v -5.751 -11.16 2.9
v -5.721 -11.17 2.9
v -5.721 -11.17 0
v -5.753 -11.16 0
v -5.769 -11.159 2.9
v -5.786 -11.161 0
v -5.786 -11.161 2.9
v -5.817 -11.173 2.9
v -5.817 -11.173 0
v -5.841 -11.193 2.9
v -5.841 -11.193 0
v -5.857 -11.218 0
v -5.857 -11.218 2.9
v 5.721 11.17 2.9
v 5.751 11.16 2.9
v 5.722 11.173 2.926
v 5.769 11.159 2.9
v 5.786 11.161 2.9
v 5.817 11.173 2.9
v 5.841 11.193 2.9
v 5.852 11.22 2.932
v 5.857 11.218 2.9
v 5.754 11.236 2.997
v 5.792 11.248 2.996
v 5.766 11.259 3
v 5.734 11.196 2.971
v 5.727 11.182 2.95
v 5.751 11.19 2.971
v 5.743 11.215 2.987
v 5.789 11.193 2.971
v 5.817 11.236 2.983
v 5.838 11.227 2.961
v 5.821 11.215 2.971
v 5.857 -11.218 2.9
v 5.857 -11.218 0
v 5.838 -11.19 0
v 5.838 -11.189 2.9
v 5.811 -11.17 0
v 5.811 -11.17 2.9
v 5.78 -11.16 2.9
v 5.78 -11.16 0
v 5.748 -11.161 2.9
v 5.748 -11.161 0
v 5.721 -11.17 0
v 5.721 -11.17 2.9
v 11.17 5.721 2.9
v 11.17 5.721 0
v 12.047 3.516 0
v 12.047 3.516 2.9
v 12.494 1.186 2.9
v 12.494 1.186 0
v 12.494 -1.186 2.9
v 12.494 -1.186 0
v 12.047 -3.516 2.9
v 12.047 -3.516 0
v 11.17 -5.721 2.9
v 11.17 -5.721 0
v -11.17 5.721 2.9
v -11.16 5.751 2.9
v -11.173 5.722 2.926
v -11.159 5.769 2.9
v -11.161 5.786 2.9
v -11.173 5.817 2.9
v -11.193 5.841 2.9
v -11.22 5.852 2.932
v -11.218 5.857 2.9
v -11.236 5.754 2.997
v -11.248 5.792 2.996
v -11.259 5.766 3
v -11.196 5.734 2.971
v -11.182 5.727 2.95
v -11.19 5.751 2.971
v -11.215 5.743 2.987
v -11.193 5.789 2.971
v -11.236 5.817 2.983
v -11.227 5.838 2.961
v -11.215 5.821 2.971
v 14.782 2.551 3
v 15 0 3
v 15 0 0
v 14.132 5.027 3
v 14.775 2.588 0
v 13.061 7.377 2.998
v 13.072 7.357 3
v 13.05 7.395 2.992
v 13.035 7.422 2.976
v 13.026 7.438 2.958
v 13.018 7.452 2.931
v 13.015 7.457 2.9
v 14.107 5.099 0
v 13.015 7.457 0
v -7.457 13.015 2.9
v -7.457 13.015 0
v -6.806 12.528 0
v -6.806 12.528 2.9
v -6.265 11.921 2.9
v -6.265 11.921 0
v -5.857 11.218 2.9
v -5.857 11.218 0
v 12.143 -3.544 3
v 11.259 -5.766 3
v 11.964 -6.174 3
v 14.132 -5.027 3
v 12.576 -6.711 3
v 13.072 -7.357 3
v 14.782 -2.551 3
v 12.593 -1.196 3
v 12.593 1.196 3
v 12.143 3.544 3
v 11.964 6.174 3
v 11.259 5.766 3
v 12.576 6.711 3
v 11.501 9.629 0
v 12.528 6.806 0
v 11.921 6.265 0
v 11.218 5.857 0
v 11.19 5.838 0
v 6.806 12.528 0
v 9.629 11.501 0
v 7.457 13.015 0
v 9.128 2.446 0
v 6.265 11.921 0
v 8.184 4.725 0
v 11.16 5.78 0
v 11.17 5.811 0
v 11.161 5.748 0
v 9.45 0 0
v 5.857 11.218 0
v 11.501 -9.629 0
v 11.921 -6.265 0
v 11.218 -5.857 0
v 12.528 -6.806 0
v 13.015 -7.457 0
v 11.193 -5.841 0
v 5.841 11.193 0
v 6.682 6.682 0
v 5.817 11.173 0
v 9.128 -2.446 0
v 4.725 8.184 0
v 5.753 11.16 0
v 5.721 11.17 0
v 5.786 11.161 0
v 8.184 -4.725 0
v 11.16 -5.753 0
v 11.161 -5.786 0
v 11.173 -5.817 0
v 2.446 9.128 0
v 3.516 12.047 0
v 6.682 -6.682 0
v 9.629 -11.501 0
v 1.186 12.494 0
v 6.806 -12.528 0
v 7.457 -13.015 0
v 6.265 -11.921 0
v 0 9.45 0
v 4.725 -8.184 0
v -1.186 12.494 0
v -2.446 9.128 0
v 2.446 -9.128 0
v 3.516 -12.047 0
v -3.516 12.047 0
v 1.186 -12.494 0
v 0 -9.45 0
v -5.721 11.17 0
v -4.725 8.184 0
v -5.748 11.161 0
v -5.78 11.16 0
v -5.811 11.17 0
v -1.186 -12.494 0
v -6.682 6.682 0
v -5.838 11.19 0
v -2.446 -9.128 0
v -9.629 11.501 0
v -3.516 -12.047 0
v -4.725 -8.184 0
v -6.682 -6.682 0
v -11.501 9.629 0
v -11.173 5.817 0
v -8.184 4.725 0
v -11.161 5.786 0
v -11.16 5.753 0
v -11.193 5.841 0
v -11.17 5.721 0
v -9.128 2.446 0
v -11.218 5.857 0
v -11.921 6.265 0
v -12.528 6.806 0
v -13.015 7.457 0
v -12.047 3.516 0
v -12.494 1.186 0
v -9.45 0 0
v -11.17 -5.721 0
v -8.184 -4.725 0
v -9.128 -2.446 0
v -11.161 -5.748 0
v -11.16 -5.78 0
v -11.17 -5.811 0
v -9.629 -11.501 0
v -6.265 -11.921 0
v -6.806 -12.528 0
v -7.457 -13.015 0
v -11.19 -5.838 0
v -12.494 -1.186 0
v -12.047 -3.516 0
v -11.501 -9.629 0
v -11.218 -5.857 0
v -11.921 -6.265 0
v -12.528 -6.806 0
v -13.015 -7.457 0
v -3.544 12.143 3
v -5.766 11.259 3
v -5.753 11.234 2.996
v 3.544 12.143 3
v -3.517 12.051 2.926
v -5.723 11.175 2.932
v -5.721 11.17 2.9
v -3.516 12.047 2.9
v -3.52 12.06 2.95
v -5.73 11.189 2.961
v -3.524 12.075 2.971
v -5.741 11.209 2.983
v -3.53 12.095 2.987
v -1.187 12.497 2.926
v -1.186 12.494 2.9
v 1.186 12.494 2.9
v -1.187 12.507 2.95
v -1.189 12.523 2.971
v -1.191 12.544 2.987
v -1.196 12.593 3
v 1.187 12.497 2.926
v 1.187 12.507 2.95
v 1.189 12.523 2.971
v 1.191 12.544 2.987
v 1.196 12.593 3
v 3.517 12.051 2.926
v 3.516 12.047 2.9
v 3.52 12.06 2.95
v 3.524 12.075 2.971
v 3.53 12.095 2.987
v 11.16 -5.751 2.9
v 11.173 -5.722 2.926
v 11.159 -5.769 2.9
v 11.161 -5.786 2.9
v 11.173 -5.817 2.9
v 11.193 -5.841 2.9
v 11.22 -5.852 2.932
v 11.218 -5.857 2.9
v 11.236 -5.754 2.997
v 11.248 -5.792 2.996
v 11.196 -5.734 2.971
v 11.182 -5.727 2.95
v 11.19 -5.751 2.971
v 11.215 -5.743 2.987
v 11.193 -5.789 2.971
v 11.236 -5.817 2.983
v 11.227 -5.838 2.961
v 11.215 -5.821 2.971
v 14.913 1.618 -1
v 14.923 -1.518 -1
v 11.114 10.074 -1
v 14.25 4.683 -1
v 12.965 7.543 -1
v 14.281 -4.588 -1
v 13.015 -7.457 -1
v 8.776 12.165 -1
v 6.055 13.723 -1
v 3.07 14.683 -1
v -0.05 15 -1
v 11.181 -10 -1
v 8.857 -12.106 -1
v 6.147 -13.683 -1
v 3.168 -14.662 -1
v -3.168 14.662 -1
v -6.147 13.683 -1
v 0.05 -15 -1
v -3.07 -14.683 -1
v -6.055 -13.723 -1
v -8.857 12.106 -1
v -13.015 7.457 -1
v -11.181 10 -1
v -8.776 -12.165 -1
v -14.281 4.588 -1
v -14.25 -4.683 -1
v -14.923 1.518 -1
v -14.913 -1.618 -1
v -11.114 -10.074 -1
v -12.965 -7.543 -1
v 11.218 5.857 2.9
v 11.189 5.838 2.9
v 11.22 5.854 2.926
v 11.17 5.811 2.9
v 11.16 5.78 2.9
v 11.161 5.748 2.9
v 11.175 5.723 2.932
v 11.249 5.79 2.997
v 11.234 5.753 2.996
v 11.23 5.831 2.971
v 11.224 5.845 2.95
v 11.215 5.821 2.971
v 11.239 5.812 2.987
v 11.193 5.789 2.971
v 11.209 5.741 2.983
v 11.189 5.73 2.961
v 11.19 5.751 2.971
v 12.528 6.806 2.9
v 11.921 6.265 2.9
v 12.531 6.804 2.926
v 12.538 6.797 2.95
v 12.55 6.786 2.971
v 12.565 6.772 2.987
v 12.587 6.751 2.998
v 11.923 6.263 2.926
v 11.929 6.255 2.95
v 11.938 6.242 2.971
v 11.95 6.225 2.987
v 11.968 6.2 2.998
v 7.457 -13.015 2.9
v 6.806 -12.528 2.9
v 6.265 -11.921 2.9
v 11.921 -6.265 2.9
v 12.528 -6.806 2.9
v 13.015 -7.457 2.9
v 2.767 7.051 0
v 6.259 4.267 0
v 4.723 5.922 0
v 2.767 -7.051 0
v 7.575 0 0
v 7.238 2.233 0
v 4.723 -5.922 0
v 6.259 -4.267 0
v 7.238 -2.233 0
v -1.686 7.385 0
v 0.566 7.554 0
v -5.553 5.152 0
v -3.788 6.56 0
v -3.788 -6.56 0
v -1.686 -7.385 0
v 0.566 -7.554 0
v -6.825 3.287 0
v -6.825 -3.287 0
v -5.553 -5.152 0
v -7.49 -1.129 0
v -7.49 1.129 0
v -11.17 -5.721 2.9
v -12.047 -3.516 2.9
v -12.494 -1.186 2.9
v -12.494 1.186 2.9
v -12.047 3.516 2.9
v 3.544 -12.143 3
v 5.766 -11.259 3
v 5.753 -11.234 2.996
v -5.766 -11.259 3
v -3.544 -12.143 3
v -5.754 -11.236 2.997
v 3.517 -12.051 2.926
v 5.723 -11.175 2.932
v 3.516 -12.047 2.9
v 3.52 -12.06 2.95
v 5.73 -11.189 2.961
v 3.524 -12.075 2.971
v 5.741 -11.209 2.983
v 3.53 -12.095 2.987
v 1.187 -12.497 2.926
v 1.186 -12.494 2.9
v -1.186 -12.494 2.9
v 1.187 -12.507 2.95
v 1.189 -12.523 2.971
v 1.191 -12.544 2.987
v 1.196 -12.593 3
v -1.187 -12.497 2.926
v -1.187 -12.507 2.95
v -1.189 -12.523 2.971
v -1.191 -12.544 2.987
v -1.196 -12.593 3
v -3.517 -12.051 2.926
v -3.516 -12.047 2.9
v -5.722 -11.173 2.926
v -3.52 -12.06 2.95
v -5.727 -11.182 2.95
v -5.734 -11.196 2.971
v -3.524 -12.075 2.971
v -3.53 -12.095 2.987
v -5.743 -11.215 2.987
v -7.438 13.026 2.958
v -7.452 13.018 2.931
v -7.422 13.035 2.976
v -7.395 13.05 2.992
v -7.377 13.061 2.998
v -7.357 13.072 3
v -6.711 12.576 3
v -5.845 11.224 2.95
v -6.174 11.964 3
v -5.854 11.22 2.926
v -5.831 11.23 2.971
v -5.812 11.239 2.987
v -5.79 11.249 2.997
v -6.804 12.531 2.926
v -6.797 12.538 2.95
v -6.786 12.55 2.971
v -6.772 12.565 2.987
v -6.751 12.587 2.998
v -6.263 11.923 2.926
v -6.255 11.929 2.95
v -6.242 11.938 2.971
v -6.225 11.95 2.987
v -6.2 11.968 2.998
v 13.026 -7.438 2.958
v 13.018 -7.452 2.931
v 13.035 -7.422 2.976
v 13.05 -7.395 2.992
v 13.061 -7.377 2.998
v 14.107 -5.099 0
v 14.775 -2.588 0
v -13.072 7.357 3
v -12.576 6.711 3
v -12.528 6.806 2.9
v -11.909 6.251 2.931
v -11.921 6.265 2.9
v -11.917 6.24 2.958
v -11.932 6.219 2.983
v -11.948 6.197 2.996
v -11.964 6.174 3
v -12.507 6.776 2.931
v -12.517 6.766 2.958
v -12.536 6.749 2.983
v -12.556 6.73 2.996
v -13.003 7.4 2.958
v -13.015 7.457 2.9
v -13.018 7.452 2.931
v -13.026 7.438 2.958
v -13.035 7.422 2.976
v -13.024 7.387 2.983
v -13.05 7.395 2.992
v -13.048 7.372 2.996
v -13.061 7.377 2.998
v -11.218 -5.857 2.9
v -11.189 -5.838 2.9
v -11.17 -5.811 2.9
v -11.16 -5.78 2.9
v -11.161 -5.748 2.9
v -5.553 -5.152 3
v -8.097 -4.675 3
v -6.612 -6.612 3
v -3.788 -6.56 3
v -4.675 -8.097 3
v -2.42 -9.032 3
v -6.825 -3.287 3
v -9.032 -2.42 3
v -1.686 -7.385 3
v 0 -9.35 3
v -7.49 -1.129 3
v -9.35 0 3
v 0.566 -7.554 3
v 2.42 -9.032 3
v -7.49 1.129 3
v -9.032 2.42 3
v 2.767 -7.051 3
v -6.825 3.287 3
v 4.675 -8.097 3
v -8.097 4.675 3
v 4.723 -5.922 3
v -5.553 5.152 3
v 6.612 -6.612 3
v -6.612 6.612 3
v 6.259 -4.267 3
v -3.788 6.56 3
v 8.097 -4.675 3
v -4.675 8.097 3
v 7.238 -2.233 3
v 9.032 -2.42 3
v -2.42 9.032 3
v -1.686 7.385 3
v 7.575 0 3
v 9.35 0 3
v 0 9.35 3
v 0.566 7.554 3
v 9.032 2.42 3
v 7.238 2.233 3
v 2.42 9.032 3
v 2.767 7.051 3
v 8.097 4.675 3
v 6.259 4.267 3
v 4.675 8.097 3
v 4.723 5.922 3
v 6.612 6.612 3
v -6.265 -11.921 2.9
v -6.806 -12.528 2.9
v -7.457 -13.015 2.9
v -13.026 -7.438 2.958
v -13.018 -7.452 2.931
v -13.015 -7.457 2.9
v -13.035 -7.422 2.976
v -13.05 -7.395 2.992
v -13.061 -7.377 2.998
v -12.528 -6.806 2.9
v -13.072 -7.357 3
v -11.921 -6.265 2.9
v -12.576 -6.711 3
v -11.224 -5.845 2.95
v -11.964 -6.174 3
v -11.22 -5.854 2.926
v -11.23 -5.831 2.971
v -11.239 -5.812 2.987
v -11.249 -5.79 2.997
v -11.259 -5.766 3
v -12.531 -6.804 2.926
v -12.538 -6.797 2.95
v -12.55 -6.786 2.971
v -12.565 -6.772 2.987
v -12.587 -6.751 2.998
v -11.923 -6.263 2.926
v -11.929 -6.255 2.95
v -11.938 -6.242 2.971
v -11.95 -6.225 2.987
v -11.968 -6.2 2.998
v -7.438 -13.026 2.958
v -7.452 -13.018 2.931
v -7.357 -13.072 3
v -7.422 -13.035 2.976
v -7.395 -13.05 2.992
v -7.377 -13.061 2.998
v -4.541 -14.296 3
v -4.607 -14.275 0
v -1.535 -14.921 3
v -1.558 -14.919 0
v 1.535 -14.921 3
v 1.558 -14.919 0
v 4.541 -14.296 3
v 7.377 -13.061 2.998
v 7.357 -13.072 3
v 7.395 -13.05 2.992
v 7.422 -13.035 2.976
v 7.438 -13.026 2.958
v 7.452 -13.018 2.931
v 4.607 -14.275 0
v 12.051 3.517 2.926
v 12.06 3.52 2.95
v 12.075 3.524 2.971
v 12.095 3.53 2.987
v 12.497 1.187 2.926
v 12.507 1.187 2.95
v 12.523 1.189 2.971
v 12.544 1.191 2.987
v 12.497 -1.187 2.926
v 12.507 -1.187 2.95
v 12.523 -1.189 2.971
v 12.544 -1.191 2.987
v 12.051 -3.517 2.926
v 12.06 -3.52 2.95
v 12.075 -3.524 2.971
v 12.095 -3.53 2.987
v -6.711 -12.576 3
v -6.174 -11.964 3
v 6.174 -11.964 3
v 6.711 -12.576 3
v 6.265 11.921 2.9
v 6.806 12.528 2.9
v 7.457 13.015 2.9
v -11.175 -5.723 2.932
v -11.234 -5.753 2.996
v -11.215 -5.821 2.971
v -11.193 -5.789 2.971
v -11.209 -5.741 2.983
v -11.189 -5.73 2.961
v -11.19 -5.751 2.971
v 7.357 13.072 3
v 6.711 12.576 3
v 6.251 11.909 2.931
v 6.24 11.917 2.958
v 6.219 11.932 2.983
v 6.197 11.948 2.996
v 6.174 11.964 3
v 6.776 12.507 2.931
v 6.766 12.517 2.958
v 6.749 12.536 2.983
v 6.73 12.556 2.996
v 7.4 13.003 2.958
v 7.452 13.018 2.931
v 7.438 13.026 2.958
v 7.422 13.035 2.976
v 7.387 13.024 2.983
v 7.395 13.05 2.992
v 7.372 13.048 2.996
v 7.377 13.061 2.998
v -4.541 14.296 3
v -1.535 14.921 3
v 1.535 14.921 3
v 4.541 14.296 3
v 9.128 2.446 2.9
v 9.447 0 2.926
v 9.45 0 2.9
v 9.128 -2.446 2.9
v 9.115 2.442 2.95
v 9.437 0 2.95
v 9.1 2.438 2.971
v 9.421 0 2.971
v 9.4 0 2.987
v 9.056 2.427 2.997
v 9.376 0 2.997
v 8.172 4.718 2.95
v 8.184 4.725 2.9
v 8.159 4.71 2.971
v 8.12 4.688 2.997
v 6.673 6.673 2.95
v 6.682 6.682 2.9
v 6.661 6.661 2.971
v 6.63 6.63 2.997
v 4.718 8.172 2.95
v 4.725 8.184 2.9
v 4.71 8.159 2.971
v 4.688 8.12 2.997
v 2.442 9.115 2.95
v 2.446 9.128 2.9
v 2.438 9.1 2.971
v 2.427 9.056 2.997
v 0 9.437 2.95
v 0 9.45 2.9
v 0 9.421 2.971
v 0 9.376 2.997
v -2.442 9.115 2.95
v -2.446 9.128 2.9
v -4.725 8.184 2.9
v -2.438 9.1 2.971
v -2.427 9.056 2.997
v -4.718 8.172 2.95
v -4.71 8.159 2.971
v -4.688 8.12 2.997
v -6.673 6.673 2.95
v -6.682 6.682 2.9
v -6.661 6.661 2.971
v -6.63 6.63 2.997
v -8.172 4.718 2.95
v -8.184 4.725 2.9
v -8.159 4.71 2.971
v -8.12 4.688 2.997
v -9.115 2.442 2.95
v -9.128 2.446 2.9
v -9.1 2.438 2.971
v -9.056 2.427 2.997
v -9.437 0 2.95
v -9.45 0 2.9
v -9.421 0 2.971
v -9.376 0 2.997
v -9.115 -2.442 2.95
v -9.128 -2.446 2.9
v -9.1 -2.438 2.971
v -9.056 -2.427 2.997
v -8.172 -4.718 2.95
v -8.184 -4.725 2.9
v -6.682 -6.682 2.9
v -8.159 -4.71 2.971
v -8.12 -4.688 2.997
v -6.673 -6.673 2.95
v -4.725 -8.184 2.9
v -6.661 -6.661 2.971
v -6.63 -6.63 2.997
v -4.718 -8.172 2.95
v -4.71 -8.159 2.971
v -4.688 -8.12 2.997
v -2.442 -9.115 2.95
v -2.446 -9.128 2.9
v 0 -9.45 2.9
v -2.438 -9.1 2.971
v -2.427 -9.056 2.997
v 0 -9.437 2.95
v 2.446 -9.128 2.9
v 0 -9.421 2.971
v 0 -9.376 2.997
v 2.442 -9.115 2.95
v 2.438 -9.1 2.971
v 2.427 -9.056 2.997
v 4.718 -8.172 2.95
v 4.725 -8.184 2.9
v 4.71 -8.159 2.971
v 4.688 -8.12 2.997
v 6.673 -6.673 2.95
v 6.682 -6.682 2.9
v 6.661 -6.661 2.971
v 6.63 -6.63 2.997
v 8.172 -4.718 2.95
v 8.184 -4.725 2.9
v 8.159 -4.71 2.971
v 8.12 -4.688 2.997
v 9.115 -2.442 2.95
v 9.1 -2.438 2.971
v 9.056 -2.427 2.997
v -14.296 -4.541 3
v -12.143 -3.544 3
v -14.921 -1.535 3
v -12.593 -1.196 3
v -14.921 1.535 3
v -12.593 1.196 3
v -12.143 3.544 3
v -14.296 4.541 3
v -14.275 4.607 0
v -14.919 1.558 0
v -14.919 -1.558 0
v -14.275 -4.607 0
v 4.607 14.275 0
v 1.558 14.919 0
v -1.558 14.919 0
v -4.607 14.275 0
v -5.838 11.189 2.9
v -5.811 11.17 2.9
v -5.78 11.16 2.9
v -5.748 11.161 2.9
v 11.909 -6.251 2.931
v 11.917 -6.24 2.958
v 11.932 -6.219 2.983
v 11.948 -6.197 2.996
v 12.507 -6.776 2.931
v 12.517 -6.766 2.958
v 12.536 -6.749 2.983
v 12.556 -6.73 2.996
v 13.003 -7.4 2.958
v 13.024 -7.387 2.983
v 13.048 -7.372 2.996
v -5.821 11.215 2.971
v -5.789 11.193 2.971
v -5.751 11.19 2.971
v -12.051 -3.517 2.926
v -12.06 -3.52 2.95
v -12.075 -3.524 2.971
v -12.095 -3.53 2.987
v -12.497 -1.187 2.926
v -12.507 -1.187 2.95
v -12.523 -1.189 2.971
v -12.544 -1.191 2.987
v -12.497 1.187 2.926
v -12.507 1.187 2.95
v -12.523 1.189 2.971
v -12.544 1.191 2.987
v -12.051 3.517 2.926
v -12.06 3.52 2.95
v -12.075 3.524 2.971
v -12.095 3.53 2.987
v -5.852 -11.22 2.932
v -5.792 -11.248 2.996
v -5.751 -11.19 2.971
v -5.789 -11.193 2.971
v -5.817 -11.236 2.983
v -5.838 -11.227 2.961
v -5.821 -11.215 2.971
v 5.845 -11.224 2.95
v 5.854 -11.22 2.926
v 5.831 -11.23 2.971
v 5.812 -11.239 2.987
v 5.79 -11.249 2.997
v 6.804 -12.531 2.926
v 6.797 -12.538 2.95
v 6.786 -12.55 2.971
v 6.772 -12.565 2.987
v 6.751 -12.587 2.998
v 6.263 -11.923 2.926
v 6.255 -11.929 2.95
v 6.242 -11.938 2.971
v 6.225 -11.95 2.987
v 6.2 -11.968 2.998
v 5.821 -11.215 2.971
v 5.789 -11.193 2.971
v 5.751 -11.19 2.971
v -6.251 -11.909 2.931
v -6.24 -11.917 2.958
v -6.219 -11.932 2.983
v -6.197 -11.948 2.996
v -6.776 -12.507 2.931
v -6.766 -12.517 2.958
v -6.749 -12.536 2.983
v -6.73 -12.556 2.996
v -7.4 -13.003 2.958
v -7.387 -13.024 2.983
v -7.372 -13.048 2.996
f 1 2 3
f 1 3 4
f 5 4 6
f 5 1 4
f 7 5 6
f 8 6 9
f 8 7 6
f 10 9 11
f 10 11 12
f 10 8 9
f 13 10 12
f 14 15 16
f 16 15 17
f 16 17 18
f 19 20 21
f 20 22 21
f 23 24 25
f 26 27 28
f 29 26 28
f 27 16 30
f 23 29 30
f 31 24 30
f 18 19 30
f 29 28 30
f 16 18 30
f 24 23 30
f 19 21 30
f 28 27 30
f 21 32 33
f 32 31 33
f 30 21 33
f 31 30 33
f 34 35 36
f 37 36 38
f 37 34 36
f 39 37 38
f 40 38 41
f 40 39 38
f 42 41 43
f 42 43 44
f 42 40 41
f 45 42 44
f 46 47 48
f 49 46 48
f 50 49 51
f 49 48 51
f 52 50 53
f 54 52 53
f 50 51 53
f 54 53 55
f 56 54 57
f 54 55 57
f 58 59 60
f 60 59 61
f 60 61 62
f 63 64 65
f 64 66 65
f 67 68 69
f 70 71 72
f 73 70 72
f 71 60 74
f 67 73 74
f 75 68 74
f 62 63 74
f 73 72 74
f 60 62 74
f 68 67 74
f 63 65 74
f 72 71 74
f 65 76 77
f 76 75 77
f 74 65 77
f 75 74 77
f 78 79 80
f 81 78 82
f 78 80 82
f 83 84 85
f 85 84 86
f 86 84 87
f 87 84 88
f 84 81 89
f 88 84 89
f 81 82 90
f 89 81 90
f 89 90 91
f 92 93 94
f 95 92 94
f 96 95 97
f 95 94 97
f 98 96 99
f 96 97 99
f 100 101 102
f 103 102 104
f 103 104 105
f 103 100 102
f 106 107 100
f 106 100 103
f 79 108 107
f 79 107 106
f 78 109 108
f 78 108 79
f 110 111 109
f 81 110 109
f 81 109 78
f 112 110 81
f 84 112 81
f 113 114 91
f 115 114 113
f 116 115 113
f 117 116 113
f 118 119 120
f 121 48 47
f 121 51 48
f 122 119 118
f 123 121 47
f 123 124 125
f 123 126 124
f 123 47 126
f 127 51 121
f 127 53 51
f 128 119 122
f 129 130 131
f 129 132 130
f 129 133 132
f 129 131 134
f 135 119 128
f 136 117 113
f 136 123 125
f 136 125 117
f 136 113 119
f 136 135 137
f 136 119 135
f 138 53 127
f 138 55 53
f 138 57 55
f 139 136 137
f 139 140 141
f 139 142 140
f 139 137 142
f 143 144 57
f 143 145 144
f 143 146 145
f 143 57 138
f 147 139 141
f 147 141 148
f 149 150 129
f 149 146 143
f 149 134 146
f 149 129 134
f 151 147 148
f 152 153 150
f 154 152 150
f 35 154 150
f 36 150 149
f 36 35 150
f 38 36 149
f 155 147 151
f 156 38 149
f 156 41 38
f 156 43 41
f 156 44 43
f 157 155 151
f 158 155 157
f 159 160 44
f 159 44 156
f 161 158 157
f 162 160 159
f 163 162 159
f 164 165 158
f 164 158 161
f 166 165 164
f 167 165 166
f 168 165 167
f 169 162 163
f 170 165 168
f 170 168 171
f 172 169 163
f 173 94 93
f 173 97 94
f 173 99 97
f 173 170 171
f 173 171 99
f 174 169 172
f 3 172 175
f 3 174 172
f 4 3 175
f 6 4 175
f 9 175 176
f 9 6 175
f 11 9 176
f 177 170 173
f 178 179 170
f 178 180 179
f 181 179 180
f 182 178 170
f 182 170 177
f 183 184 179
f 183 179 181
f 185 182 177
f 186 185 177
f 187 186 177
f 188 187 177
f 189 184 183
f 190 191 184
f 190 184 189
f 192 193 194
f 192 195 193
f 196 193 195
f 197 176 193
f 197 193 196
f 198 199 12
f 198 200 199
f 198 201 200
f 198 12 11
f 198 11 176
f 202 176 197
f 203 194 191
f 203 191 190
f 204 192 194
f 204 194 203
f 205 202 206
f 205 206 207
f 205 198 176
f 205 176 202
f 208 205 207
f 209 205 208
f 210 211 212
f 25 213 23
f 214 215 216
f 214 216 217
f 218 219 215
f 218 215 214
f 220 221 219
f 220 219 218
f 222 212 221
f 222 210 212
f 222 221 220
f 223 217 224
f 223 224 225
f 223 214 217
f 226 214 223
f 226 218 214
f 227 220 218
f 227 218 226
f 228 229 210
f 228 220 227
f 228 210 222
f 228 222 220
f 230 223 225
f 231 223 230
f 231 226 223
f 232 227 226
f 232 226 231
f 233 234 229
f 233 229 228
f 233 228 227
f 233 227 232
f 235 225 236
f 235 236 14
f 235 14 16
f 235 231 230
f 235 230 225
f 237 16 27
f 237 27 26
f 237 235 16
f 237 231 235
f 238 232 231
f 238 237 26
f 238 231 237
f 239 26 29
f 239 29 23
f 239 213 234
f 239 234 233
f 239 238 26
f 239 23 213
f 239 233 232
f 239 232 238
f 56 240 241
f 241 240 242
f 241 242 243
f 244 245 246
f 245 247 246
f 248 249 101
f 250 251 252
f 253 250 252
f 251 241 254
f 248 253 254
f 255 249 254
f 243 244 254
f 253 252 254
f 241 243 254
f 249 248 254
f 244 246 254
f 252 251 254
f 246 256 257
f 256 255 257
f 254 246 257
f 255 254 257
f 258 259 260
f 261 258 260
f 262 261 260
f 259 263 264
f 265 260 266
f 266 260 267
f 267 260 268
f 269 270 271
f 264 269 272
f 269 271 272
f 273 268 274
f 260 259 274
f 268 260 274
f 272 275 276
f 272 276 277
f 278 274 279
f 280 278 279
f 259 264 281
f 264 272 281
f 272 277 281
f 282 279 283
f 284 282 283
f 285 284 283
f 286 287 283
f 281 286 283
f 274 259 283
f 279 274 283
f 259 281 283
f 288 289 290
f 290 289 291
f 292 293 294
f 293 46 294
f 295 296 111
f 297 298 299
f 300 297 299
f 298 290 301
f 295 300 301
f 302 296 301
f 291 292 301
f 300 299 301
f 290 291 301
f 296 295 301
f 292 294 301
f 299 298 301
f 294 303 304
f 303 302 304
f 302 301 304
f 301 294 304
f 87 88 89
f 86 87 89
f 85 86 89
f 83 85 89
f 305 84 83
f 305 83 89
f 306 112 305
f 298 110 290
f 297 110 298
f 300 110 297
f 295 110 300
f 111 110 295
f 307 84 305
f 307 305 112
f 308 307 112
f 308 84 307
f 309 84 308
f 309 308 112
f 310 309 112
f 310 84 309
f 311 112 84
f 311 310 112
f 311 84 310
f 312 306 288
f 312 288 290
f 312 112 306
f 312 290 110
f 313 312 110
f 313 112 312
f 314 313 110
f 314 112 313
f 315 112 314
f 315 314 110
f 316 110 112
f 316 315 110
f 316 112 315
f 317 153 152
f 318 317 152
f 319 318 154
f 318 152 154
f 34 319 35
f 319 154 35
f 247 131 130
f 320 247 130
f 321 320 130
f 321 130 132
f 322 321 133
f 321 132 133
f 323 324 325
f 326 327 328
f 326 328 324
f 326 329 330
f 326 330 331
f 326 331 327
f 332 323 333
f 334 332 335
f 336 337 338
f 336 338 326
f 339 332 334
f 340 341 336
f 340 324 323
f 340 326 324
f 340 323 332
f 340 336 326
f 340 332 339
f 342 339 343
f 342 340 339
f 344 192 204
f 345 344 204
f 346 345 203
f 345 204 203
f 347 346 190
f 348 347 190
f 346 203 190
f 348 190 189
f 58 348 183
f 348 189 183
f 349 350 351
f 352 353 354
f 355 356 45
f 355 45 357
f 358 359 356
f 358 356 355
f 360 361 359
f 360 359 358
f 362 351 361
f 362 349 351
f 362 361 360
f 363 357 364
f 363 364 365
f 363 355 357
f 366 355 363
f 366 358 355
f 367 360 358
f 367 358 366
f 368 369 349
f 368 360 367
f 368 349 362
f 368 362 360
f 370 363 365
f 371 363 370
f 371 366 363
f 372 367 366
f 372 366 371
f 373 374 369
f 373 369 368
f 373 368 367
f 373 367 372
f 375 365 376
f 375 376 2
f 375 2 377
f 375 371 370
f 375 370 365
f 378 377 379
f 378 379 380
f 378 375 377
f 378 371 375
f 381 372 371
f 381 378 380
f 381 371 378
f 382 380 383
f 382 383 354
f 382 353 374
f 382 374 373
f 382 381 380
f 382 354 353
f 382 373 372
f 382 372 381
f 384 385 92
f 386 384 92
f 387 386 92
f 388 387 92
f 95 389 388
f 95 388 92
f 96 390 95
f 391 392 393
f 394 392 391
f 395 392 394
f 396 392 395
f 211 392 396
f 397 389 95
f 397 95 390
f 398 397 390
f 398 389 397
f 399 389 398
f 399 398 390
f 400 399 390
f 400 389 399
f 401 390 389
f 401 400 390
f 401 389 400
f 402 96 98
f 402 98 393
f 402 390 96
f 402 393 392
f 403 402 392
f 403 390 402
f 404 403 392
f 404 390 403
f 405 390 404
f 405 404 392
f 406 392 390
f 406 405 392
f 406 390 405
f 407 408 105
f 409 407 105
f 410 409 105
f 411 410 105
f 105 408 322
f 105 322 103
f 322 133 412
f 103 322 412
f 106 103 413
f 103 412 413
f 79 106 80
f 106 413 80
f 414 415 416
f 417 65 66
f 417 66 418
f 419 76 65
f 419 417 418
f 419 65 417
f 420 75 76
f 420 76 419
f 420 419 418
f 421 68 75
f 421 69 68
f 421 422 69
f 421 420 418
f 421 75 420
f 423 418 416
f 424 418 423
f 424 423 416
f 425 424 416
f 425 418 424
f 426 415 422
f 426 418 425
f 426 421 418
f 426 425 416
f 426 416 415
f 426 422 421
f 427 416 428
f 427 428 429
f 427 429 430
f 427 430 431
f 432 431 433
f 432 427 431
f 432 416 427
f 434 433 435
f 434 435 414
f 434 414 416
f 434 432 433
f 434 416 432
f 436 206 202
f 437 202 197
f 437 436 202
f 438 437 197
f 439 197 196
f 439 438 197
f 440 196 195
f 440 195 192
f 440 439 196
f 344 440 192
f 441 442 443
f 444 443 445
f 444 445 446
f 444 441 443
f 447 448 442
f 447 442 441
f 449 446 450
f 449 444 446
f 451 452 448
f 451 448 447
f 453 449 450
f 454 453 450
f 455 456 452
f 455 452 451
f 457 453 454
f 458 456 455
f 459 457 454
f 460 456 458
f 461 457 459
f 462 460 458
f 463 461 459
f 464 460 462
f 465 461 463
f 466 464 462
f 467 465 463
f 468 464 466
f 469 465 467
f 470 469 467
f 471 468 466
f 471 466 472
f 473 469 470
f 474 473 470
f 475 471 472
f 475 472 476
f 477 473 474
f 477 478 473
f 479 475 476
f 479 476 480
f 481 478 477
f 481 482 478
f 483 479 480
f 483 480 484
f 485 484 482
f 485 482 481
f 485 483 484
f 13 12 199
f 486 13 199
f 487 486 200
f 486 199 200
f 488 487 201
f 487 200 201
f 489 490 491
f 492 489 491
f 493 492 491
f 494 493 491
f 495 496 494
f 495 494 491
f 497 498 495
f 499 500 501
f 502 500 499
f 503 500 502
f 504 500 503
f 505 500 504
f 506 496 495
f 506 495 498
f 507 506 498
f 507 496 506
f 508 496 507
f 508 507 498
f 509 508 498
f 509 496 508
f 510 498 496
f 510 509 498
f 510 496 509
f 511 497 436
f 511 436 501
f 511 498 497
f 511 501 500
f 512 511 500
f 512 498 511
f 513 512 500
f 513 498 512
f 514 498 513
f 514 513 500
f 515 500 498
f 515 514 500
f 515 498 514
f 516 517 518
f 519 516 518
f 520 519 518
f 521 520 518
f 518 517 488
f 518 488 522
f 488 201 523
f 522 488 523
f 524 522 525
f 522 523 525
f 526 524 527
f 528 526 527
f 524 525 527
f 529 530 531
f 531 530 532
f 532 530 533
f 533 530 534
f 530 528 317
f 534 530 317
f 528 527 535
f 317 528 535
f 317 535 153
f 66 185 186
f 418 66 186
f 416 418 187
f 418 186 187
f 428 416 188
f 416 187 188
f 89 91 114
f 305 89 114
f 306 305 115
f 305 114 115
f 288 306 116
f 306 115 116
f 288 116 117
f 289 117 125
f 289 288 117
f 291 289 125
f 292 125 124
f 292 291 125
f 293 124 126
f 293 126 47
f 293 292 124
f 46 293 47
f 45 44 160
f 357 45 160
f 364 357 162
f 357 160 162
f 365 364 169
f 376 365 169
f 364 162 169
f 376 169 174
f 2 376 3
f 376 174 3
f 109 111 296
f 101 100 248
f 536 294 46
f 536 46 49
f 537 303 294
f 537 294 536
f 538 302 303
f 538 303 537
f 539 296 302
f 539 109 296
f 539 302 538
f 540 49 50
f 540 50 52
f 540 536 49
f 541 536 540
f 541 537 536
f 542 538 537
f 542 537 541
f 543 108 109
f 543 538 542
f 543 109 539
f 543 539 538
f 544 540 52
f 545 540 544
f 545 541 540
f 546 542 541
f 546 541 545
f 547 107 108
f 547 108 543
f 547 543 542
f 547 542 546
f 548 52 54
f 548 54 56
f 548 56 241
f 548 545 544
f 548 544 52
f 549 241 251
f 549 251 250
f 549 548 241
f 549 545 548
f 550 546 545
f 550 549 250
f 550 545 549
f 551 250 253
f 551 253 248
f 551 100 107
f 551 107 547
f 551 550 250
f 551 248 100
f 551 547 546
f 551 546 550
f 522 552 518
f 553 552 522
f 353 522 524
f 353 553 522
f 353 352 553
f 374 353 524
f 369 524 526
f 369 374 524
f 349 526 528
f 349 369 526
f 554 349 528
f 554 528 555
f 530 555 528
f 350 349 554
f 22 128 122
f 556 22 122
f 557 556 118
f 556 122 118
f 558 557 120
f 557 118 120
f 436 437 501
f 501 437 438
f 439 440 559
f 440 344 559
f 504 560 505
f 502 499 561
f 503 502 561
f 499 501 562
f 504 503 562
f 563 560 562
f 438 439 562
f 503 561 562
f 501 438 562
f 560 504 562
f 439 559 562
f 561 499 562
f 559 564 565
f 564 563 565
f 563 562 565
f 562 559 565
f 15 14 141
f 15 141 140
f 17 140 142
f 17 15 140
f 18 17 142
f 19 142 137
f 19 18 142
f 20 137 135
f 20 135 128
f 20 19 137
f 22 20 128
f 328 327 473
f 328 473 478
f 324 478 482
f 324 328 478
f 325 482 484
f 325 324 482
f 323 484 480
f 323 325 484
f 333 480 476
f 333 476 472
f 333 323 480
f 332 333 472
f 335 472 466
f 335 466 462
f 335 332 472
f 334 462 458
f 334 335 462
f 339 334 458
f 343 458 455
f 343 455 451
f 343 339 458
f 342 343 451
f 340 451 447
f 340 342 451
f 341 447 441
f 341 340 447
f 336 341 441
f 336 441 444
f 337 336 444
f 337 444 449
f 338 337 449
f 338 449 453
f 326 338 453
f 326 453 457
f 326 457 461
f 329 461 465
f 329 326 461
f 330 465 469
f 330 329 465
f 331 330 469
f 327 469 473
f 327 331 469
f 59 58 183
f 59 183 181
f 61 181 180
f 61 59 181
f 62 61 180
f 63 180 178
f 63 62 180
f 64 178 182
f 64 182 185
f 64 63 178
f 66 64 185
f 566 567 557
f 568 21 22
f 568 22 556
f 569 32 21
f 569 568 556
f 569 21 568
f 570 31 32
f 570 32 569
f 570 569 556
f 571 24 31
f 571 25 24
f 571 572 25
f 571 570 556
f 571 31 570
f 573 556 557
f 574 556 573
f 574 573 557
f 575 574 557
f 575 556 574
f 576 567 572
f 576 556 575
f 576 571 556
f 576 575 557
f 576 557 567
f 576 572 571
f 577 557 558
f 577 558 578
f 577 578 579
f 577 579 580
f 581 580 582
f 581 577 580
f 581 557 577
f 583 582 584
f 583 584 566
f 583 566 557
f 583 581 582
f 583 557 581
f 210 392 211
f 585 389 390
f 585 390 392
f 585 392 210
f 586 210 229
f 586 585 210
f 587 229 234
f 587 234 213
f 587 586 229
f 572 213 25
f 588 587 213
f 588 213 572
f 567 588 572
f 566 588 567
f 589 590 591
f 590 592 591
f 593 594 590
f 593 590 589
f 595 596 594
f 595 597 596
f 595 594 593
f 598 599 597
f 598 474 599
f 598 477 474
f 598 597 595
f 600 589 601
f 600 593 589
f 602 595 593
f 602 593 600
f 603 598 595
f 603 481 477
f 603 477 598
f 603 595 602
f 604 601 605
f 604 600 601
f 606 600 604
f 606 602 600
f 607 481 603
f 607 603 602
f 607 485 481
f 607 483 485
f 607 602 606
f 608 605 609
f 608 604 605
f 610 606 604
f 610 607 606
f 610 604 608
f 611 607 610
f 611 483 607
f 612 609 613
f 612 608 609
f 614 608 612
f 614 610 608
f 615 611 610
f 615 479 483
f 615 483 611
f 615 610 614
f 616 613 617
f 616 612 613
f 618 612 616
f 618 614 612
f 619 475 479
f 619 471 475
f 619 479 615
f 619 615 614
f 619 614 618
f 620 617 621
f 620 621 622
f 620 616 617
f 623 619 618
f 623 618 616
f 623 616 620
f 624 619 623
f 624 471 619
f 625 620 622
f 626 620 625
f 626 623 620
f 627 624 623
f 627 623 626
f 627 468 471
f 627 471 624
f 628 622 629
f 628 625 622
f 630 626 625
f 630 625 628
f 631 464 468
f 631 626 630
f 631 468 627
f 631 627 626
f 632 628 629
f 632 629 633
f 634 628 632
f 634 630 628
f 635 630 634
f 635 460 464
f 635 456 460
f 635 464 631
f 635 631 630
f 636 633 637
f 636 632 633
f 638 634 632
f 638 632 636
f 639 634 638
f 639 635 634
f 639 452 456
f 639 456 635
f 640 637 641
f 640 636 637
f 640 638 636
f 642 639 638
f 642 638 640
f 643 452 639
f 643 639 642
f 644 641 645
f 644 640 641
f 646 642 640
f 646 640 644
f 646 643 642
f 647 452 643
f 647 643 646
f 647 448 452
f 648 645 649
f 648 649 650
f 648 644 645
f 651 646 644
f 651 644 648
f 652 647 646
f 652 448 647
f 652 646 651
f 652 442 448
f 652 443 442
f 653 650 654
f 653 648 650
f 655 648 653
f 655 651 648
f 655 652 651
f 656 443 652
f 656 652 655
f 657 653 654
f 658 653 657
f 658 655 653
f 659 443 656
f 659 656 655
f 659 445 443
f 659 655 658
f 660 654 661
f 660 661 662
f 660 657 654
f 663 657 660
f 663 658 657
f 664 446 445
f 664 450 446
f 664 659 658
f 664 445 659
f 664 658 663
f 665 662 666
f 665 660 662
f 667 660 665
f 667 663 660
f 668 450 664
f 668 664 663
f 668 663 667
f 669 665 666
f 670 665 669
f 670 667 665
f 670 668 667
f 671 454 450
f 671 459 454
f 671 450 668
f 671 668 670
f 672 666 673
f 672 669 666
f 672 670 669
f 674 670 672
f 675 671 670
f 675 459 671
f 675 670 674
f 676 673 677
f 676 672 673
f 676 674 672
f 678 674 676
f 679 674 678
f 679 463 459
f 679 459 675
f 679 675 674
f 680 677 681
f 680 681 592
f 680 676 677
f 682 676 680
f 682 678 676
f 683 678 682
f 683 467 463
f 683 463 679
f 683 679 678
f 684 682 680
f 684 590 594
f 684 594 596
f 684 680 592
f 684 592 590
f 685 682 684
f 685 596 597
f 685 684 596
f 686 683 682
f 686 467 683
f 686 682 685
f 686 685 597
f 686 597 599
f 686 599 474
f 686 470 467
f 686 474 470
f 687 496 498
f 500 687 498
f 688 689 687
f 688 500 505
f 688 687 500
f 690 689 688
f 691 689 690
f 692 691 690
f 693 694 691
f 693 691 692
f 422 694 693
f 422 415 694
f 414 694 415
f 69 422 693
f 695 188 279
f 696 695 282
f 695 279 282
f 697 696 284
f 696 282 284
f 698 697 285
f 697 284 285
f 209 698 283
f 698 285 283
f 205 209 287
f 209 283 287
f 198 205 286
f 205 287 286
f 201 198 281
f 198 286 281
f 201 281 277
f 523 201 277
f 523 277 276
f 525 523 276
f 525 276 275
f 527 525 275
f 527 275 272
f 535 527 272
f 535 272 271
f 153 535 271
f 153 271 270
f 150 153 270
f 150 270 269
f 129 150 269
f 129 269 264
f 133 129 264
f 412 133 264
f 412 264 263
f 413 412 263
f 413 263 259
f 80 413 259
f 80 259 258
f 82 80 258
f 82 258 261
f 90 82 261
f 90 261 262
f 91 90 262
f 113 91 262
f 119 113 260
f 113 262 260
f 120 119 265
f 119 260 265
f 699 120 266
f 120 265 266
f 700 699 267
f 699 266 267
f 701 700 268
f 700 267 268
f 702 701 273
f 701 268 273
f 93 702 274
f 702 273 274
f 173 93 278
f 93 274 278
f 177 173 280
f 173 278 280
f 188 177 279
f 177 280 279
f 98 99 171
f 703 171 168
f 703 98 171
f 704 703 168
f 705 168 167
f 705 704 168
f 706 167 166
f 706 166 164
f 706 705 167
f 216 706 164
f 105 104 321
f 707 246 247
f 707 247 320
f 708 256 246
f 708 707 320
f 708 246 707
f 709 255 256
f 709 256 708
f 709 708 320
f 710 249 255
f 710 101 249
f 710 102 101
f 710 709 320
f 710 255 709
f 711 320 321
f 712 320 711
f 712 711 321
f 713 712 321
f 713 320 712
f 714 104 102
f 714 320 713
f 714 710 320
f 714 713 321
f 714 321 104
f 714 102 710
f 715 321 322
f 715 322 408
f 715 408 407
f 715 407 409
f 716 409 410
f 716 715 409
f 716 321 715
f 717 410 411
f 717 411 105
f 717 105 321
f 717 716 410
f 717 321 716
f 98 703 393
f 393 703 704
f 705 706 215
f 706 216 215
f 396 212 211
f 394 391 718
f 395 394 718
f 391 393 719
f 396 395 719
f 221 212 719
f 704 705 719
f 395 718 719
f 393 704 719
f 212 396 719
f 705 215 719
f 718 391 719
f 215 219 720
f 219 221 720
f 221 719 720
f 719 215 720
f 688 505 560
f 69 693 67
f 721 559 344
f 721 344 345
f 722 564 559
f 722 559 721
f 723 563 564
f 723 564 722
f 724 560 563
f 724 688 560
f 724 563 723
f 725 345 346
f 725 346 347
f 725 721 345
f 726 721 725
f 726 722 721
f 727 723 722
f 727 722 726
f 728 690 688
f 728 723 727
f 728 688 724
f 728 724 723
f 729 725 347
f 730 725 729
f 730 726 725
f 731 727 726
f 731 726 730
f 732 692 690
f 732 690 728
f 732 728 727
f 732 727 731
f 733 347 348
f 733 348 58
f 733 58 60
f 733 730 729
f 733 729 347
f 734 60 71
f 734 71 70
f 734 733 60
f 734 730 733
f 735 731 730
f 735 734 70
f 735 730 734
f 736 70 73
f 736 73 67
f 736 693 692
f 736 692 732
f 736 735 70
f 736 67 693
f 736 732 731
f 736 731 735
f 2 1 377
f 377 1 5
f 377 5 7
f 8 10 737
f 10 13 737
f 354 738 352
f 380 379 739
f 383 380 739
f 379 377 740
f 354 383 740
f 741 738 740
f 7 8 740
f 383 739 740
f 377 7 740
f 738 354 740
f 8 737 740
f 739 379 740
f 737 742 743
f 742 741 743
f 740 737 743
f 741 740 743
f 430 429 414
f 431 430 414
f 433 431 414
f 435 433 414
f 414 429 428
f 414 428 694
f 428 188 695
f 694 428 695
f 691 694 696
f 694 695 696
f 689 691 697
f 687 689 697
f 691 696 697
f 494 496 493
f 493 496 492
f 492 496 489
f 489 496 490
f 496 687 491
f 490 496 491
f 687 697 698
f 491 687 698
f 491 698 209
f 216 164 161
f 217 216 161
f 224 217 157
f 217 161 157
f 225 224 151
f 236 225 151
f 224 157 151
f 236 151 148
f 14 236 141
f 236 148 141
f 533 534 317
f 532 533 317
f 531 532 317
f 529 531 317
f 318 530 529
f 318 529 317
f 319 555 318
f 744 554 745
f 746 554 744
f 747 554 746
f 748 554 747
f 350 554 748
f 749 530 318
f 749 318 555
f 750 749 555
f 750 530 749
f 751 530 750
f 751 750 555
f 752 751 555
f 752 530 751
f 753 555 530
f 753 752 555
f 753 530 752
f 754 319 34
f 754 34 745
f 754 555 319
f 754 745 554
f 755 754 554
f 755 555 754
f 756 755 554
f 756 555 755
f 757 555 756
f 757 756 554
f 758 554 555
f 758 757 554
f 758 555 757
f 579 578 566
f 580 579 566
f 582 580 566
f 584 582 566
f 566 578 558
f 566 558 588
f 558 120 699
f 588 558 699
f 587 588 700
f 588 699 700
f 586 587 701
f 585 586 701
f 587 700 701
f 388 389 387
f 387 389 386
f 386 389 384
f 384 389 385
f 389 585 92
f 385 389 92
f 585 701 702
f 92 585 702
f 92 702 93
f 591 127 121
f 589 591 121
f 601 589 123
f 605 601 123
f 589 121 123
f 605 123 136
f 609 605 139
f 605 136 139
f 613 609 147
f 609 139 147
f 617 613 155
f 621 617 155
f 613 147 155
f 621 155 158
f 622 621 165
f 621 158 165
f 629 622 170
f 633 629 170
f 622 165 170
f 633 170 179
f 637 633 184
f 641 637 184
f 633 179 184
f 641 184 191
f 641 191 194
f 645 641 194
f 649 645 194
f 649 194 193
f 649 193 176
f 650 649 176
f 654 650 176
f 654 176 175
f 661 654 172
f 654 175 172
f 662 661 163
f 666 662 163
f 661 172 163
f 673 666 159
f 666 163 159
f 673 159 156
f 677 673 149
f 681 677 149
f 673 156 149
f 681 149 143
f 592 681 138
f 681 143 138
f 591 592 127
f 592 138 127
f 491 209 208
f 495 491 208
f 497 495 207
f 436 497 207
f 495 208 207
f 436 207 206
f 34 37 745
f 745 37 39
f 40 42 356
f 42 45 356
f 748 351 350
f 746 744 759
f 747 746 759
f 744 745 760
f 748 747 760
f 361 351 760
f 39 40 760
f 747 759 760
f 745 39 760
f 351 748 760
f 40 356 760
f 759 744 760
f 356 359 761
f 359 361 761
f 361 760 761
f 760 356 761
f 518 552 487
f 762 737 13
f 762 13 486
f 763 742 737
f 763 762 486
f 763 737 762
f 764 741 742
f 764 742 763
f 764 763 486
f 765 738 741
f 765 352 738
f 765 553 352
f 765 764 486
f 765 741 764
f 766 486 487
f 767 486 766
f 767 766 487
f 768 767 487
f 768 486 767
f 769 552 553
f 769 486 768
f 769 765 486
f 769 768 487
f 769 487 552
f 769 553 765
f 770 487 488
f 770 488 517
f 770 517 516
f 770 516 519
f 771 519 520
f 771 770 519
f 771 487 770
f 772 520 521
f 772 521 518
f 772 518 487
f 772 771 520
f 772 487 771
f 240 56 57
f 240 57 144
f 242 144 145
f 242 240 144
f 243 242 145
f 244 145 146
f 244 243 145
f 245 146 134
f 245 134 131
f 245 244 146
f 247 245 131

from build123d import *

# Parameters (mm, degrees)
BOSS_EXTRUDE1_DEPTH   = 3
BOSS_EXTRUDE1_2_DEPTH = 3
BOSS_EXTRUDE1_3_DEPTH = 3
BOSS_EXTRUDE1_4_DEPTH = 3
SKETCH1_R             = 9.45
SKETCH1_R_2           = 7.575
BOSS_EXTRUDE1_5_DEPTH = 3
BOSS_EXTRUDE2_START   = -1
SKETCH2_R             = 15
BOSS_EXTRUDE2_DEPTH   = 1
FILLET1_R             = 0.1
FILLET2_R             = 0.1


with BuildPart() as part:
    # Sketch1 → Boss-Extrude1 (new body)
    with BuildSketch(Plane.XY):
        with BuildLine():
            ThreePointArc((5.814987036, 11.121529831), (6.485587296, 12.198625444), (7.456549067, 13.01537076))
            ThreePointArc((7.456549067, 13.01537076), (0, 15), (-7.456549067, 13.01537076))
            ThreePointArc((-7.456549067, 13.01537076), (-6.485587296, 12.198625444), (-5.814987036, 11.121529831))
            ThreePointArc((-5.814987036, 11.121529831), (0, 12.55), (5.814987036, 11.121529831))
        make_face()
    extrude(amount=BOSS_EXTRUDE1_DEPTH)



with BuildPart() as body_2:
    # Sketch1 → Boss-Extrude1 2 (new body)
    with BuildSketch(Plane.XY):
        with BuildLine():
            ThreePointArc((13.01537076, -7.456549067), (14.495353762, -3.858071967), (15, 0))
            ThreePointArc((15, 0), (14.495353762, 3.858071967), (13.01537076, 7.456549067))
            ThreePointArc((13.01537076, 7.456549067), (12.198625444, 6.485587296), (11.121529831, 5.814987036))
            ThreePointArc((11.121529831, 5.814987036), (12.55, 0), (11.121529831, -5.814987036))
            ThreePointArc((11.121529831, -5.814987036), (12.198625444, -6.485587296), (13.01537076, -7.456549067))
        make_face()
    extrude(amount=BOSS_EXTRUDE1_2_DEPTH)


with BuildPart() as body_3:
    # Sketch1 → Boss-Extrude1 3 (new body)
    with BuildSketch(Plane.XY):
        with BuildLine():
            ThreePointArc((-7.456549067, -13.01537076), (0, -15), (7.456549067, -13.01537076))
            ThreePointArc((7.456549067, -13.01537076), (6.485587296, -12.198625444), (5.814987036, -11.121529831))
            ThreePointArc((5.814987036, -11.121529831), (0, -12.55), (-5.814987036, -11.121529831))
            ThreePointArc((-5.814987036, -11.121529831), (-6.485587296, -12.198625444), (-7.456549067, -13.01537076))
        make_face()
    extrude(amount=BOSS_EXTRUDE1_3_DEPTH)


with BuildPart() as body_4:
    # Sketch1 → Boss-Extrude1 4 (new body)
    with BuildSketch(Plane.XY):
        with BuildLine():
            ThreePointArc((-11.121529831, 5.814987036), (-12.198625444, 6.485587296), (-13.01537076, 7.456549067))
            ThreePointArc((-13.01537076, 7.456549067), (-15, 0), (-13.01537076, -7.456549067))
            ThreePointArc((-13.01537076, -7.456549067), (-12.198625444, -6.485587296), (-11.121529831, -5.814987036))
            ThreePointArc((-11.121529831, -5.814987036), (-12.55, 0), (-11.121529831, 5.814987036))
        make_face()
    extrude(amount=BOSS_EXTRUDE1_4_DEPTH)


with BuildPart() as body_5:
    # Sketch1 → Boss-Extrude1 5 (new body)
    with BuildSketch(Plane.XY):
        Circle(SKETCH1_R)
        Circle(SKETCH1_R_2, mode=Mode.SUBTRACT)
    extrude(amount=BOSS_EXTRUDE1_5_DEPTH)


with BuildPart() as part_1:
    add(part.part)

    add(body_2.part)  # Boss-Extrude2 merges body 2

    add(body_3.part)  # Boss-Extrude2 merges body 3

    add(body_4.part)  # Boss-Extrude2 merges body 4

    add(body_5.part)  # Boss-Extrude2 merges body 5
    # Sketch2 → Boss-Extrude2 (add)
    with BuildSketch(Plane.XY.offset(BOSS_EXTRUDE2_START)):
        with Locations(Location((0, 0, 0), (0, 0, 150.191461703))):
            Circle(SKETCH2_R)
    extrude(amount=BOSS_EXTRUDE2_DEPTH)

    # Fillet1
    fillet1_edges = [part_1.edges().sort_by_distance(p)[0] for p in [
        (11.121529831, 5.814987036, 1.5),
        (11.121529831, -5.814987036, 1.5),
        (5.814987036, -11.121529831, 1.5),
        (-5.814987036, -11.121529831, 1.5),
        (-11.121529831, -5.814987036, 1.5),
        (-11.121529831, 5.814987036, 1.5),
        (5.814987036, 11.121529831, 1.5),
        (-5.814987036, 11.121529831, 1.5),
    ]]
    fillet(fillet1_edges, radius=FILLET1_R)

    # Fillet2
    fillet2_edges = [part_1.edges().sort_by_distance(p)[0] for p in [
        (6.520367717, 12.238227379, 3),
        (12.238227379, -6.520367717, 3),
        (-6.520367717, -12.238227379, 3),
        (-12.238227379, 6.520367717, 3),
        (-9.45, 0, 3),
        (0, -12.55, 3),
        (6.520367717, -12.238227379, 3),
        (5.799143147, -11.164972845, 3),
        (-5.799143147, -11.164972845, 3),
        (12.55, 0, 3),
        (12.238227379, 6.520367717, 3),
        (11.164972845, 5.799143147, 3),
        (11.164972845, -5.799143147, 3),
        (0, 12.55, 3),
        (-6.520367717, 12.238227379, 3),
        (-5.799143147, 11.164972845, 3),
        (5.799143147, 11.164972845, 3),
        (-12.55, 0, 3),
        (-12.238227379, -6.520367717, 3),
        (-11.164972845, -5.799143147, 3),
        (-11.164972845, 5.799143147, 3),
    ]]
    fillet(fillet2_edges, radius=FILLET2_R - 0.0001)  # a hair under: the kernel refuses the full size


solid = part_1.part
